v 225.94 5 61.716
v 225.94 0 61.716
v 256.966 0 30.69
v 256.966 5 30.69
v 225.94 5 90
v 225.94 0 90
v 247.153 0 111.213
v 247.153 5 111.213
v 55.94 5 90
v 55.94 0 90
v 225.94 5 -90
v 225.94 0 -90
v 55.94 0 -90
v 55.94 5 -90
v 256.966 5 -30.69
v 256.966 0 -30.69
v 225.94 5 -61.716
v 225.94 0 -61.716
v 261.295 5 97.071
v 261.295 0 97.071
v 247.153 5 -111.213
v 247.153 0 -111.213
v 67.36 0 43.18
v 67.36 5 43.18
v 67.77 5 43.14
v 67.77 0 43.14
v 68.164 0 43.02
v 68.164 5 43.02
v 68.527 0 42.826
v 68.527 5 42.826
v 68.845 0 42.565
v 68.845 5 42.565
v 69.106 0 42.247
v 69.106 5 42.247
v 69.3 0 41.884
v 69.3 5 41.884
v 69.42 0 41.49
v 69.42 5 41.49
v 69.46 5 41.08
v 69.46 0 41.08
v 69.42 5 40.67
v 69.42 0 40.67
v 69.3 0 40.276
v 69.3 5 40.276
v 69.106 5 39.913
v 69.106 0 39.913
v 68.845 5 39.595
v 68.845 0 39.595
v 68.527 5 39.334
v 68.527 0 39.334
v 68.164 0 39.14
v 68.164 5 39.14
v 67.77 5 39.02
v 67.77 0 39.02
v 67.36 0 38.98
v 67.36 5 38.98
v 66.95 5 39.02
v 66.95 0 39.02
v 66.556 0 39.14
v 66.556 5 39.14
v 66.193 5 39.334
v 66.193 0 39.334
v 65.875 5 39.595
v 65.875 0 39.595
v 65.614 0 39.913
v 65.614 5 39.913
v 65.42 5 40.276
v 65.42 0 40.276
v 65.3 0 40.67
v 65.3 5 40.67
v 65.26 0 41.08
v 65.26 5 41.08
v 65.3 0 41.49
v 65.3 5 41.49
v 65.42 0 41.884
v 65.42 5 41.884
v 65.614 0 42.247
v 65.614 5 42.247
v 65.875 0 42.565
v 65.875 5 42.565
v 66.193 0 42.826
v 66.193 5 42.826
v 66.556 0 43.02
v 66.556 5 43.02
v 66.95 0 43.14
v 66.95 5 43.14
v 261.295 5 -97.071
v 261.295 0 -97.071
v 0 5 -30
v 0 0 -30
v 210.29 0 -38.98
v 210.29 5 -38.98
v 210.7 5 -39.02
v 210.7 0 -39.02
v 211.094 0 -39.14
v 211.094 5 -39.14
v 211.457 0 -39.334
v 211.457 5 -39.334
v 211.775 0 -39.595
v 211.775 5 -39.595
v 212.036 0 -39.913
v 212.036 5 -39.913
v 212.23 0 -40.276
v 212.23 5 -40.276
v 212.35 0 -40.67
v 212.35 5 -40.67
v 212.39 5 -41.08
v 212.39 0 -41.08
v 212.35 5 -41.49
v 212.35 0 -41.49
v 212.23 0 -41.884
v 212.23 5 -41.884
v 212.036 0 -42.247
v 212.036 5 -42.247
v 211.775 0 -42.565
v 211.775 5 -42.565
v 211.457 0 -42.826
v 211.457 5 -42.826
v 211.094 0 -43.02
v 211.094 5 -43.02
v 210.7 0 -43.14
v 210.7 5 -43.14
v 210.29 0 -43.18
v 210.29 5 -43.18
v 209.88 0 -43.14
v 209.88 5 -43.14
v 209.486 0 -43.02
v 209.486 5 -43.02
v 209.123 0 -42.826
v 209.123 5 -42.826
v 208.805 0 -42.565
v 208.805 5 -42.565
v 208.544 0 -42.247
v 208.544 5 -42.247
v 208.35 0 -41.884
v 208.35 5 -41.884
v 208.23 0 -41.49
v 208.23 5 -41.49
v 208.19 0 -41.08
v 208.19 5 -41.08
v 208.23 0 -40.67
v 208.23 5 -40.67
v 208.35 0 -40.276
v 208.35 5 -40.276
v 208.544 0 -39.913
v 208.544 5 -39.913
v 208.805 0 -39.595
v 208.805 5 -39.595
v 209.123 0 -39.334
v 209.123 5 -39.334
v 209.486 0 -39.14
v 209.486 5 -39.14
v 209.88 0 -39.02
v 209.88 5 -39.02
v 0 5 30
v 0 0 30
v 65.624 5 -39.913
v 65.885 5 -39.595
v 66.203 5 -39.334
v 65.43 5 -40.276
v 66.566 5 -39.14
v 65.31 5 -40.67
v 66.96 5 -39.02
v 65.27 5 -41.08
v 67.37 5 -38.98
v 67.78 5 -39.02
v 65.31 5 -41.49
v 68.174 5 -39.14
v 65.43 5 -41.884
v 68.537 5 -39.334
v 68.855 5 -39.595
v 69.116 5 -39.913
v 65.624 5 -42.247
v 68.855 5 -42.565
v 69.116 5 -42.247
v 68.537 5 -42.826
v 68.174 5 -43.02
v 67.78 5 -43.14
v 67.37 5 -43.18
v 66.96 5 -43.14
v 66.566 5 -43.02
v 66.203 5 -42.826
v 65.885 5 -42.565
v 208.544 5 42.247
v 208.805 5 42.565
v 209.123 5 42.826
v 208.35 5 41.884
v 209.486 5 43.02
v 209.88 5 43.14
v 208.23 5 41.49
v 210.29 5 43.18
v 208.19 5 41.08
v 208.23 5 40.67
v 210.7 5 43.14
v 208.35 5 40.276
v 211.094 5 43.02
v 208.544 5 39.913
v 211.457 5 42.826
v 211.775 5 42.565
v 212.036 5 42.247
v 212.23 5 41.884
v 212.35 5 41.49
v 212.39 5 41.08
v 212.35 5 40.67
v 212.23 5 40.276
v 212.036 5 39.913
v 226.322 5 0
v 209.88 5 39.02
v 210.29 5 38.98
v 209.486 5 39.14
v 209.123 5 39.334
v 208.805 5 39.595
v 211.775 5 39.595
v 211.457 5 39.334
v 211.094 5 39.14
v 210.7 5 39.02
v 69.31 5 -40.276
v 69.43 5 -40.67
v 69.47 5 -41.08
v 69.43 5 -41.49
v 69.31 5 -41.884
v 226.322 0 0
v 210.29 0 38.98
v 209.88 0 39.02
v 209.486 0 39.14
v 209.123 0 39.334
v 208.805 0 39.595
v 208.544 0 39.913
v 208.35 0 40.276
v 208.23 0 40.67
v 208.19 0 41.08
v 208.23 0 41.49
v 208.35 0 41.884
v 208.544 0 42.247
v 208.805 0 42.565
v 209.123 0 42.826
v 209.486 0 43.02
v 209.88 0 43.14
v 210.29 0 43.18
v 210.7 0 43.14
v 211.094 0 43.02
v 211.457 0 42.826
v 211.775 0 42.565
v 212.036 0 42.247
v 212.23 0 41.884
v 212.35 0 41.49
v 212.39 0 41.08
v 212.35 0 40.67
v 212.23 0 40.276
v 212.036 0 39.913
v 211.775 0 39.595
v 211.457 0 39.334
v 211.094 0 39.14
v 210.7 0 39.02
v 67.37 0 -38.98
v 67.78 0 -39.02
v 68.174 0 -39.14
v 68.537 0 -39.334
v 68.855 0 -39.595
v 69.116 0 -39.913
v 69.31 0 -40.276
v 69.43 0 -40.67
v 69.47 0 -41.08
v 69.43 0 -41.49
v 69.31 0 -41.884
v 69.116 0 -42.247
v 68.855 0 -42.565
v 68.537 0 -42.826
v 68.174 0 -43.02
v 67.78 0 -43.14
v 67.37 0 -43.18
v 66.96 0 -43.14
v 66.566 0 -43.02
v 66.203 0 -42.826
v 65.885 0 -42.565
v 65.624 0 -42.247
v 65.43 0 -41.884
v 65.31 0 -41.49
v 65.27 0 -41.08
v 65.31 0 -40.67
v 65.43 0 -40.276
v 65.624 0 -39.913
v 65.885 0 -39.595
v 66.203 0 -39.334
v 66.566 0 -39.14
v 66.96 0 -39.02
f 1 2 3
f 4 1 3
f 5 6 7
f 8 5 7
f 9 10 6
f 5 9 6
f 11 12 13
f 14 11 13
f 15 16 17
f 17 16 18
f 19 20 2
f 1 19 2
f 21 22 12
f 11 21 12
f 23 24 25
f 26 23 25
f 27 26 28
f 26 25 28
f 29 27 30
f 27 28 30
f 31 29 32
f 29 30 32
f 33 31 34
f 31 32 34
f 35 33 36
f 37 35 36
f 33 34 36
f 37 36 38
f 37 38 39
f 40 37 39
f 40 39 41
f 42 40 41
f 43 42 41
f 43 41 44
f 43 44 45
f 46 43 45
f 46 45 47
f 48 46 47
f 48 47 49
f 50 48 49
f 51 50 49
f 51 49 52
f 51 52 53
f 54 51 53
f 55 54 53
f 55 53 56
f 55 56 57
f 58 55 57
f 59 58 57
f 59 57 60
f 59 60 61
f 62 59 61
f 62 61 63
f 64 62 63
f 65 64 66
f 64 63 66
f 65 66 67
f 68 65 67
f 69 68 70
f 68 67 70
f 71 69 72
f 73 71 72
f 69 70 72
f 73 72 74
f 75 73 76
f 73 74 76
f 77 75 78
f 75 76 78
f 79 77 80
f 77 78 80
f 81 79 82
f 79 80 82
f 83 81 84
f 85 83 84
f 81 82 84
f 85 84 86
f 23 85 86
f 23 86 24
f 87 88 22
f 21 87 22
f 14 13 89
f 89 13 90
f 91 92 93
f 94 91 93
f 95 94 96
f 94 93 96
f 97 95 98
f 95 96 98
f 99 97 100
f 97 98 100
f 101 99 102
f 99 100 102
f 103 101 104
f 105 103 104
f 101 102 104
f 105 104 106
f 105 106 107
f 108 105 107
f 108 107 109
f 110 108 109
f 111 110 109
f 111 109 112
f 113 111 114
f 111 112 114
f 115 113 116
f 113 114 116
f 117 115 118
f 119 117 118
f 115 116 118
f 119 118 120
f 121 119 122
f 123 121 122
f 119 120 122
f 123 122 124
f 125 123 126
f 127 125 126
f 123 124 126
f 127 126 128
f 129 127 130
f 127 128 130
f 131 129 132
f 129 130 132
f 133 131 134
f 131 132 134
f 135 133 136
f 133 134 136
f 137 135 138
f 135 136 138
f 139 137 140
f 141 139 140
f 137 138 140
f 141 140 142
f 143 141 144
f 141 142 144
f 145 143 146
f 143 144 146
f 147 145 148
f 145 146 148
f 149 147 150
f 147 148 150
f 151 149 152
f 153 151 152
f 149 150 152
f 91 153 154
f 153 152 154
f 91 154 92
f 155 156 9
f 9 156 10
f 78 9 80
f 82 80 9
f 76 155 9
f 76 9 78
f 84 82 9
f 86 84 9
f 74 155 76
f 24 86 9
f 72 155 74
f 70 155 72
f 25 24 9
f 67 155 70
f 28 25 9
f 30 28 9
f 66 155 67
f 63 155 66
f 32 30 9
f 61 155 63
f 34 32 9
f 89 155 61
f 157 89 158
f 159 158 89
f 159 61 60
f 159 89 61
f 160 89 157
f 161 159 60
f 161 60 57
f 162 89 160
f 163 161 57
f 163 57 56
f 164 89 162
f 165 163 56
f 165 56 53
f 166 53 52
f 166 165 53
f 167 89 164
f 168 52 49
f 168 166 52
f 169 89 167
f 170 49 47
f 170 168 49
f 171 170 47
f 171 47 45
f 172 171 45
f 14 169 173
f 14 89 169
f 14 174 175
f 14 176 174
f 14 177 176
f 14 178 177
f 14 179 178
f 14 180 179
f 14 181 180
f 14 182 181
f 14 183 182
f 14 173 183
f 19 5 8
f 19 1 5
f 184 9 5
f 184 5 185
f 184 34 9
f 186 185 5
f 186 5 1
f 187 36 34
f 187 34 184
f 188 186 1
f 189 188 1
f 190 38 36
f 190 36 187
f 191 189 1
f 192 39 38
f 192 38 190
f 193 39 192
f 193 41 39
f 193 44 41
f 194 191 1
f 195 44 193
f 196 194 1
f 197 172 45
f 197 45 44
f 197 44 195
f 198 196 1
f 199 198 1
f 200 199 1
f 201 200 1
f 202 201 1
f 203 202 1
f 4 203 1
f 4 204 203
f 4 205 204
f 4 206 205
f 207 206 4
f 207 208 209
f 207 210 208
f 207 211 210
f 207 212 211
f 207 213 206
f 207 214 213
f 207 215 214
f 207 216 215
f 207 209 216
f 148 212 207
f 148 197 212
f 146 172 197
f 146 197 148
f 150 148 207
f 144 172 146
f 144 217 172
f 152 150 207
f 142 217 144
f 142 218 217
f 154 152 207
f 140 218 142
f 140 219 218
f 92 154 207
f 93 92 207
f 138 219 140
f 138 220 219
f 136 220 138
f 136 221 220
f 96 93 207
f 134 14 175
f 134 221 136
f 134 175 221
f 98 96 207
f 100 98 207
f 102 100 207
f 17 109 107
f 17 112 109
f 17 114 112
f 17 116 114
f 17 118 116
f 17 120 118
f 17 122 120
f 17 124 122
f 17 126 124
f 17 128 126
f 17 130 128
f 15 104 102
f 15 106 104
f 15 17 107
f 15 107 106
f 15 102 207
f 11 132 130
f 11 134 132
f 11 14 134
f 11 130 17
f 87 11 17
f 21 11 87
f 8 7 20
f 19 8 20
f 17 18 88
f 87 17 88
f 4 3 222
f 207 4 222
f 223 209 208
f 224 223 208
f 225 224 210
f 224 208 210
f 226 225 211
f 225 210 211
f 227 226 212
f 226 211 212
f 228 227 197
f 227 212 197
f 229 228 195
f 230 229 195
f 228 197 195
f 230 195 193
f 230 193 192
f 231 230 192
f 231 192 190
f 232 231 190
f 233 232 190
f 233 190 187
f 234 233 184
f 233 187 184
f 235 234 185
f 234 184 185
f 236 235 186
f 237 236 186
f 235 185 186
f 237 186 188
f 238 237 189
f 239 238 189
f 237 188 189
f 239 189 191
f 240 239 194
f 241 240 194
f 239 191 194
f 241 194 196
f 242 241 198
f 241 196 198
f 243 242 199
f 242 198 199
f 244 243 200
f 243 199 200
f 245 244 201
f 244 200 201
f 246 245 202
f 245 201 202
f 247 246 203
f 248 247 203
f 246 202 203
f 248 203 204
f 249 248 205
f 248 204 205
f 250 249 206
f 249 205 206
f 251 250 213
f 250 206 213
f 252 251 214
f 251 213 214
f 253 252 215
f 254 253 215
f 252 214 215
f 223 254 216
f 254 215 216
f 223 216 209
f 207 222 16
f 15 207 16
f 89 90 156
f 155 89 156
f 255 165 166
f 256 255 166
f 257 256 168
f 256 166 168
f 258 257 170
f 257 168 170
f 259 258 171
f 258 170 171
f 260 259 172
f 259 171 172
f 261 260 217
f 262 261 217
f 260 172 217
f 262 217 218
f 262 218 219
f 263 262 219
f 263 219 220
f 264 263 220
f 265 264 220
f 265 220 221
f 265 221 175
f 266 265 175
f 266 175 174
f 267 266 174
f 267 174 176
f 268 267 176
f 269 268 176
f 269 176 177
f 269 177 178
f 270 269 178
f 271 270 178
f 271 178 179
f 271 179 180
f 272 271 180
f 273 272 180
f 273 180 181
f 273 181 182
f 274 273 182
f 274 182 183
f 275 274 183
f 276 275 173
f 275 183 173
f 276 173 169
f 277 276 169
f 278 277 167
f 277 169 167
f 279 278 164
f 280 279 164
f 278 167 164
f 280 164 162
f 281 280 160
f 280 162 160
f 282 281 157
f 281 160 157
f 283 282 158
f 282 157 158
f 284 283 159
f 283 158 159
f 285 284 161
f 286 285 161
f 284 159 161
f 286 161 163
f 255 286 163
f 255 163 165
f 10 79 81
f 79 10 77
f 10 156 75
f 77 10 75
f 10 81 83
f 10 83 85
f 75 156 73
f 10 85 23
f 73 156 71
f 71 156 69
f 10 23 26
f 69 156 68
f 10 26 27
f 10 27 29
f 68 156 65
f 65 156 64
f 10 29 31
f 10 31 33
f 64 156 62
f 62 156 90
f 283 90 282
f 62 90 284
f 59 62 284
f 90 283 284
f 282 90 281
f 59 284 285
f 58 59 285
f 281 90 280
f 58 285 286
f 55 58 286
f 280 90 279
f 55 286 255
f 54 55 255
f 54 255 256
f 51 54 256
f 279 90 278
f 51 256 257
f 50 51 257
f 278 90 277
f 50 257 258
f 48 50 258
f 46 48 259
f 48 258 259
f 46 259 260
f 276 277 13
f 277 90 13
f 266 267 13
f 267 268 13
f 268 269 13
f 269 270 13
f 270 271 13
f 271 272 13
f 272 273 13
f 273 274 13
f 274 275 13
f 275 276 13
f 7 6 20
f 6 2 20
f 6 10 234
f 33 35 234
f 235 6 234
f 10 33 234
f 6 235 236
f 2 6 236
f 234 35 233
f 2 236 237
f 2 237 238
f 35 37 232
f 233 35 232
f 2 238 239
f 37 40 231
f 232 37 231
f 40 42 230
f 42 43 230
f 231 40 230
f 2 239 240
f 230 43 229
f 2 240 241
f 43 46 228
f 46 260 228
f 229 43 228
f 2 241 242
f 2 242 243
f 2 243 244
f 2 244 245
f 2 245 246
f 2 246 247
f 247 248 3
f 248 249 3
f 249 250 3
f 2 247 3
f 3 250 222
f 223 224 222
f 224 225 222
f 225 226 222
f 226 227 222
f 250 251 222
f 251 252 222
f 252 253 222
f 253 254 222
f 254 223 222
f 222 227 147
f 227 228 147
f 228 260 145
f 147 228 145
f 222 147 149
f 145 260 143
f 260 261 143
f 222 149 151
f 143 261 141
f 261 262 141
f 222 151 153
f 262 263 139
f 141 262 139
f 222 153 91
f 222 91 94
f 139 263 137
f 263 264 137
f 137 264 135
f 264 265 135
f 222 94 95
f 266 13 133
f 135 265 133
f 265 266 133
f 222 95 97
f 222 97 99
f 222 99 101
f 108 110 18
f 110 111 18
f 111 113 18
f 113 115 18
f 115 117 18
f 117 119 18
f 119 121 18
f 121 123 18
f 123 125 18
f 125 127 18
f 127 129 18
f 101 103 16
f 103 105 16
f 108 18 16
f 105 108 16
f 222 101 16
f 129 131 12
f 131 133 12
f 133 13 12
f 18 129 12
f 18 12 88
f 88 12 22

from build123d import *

# Parameters (mm, degrees)
BOSS_EXTRUDE1_DEPTH = 5
SKETCH2_R           = 2.1
CUT_EXTRUDE1_DEPTH  = 5
SKETCH5_R           = 2.1
CUT_EXTRUDE4_DEPTH  = 10


with BuildPart() as part:
    # Sketch1 → Boss-Extrude1 (new body)
    with BuildSketch(Plane(origin=(0, 0, 0), x_dir=(1, 0, 0), z_dir=(0, 1, 0))):
        Polygon((0, 30), (0, -30), (55.94, -90), (225.94, -90), (247.153203436, -111.213203436), (261.295339059, -97.071067812), (225.94, -61.715728753), (256.965728753, -30.69), (226.32179728, 0), (256.965728753, 30.69), (225.94, 61.715728753), (261.295339059, 97.071067812), (247.153203436, 111.213203436), (225.94, 90), (55.94, 90), align=None)
    extrude(amount=BOSS_EXTRUDE1_DEPTH)

    # Sketch2 → Cut-Extrude1 (cut)
    with BuildSketch(Plane(origin=(0, 5, 0), x_dir=(1, 0, 0), z_dir=(0, 1, 0))):
        with Locations(Location((210.29, 41.08, 0), (0, 0, 270))):
            Circle(SKETCH2_R)
        with Locations(Location((210.29, -41.08, 0), (0, 0, 90))):
            Circle(SKETCH2_R)
    extrude(amount=-CUT_EXTRUDE1_DEPTH, mode=Mode.SUBTRACT)

    # Sketch5 → Cut-Extrude4 (cut)
    with BuildSketch(Plane(origin=(0, 5, 0), x_dir=(1, 0, 0), z_dir=(0, 1, 0))):
        with Locations(Location((67.37, 41.08, 0), (0, 0, 270))):
            Circle(SKETCH5_R)
        with Locations(Location((67.36, -41.08, 0), (0, 0, 270))):
            Circle(SKETCH5_R)
    extrude(amount=-CUT_EXTRUDE4_DEPTH, mode=Mode.SUBTRACT)


solid = part.part
